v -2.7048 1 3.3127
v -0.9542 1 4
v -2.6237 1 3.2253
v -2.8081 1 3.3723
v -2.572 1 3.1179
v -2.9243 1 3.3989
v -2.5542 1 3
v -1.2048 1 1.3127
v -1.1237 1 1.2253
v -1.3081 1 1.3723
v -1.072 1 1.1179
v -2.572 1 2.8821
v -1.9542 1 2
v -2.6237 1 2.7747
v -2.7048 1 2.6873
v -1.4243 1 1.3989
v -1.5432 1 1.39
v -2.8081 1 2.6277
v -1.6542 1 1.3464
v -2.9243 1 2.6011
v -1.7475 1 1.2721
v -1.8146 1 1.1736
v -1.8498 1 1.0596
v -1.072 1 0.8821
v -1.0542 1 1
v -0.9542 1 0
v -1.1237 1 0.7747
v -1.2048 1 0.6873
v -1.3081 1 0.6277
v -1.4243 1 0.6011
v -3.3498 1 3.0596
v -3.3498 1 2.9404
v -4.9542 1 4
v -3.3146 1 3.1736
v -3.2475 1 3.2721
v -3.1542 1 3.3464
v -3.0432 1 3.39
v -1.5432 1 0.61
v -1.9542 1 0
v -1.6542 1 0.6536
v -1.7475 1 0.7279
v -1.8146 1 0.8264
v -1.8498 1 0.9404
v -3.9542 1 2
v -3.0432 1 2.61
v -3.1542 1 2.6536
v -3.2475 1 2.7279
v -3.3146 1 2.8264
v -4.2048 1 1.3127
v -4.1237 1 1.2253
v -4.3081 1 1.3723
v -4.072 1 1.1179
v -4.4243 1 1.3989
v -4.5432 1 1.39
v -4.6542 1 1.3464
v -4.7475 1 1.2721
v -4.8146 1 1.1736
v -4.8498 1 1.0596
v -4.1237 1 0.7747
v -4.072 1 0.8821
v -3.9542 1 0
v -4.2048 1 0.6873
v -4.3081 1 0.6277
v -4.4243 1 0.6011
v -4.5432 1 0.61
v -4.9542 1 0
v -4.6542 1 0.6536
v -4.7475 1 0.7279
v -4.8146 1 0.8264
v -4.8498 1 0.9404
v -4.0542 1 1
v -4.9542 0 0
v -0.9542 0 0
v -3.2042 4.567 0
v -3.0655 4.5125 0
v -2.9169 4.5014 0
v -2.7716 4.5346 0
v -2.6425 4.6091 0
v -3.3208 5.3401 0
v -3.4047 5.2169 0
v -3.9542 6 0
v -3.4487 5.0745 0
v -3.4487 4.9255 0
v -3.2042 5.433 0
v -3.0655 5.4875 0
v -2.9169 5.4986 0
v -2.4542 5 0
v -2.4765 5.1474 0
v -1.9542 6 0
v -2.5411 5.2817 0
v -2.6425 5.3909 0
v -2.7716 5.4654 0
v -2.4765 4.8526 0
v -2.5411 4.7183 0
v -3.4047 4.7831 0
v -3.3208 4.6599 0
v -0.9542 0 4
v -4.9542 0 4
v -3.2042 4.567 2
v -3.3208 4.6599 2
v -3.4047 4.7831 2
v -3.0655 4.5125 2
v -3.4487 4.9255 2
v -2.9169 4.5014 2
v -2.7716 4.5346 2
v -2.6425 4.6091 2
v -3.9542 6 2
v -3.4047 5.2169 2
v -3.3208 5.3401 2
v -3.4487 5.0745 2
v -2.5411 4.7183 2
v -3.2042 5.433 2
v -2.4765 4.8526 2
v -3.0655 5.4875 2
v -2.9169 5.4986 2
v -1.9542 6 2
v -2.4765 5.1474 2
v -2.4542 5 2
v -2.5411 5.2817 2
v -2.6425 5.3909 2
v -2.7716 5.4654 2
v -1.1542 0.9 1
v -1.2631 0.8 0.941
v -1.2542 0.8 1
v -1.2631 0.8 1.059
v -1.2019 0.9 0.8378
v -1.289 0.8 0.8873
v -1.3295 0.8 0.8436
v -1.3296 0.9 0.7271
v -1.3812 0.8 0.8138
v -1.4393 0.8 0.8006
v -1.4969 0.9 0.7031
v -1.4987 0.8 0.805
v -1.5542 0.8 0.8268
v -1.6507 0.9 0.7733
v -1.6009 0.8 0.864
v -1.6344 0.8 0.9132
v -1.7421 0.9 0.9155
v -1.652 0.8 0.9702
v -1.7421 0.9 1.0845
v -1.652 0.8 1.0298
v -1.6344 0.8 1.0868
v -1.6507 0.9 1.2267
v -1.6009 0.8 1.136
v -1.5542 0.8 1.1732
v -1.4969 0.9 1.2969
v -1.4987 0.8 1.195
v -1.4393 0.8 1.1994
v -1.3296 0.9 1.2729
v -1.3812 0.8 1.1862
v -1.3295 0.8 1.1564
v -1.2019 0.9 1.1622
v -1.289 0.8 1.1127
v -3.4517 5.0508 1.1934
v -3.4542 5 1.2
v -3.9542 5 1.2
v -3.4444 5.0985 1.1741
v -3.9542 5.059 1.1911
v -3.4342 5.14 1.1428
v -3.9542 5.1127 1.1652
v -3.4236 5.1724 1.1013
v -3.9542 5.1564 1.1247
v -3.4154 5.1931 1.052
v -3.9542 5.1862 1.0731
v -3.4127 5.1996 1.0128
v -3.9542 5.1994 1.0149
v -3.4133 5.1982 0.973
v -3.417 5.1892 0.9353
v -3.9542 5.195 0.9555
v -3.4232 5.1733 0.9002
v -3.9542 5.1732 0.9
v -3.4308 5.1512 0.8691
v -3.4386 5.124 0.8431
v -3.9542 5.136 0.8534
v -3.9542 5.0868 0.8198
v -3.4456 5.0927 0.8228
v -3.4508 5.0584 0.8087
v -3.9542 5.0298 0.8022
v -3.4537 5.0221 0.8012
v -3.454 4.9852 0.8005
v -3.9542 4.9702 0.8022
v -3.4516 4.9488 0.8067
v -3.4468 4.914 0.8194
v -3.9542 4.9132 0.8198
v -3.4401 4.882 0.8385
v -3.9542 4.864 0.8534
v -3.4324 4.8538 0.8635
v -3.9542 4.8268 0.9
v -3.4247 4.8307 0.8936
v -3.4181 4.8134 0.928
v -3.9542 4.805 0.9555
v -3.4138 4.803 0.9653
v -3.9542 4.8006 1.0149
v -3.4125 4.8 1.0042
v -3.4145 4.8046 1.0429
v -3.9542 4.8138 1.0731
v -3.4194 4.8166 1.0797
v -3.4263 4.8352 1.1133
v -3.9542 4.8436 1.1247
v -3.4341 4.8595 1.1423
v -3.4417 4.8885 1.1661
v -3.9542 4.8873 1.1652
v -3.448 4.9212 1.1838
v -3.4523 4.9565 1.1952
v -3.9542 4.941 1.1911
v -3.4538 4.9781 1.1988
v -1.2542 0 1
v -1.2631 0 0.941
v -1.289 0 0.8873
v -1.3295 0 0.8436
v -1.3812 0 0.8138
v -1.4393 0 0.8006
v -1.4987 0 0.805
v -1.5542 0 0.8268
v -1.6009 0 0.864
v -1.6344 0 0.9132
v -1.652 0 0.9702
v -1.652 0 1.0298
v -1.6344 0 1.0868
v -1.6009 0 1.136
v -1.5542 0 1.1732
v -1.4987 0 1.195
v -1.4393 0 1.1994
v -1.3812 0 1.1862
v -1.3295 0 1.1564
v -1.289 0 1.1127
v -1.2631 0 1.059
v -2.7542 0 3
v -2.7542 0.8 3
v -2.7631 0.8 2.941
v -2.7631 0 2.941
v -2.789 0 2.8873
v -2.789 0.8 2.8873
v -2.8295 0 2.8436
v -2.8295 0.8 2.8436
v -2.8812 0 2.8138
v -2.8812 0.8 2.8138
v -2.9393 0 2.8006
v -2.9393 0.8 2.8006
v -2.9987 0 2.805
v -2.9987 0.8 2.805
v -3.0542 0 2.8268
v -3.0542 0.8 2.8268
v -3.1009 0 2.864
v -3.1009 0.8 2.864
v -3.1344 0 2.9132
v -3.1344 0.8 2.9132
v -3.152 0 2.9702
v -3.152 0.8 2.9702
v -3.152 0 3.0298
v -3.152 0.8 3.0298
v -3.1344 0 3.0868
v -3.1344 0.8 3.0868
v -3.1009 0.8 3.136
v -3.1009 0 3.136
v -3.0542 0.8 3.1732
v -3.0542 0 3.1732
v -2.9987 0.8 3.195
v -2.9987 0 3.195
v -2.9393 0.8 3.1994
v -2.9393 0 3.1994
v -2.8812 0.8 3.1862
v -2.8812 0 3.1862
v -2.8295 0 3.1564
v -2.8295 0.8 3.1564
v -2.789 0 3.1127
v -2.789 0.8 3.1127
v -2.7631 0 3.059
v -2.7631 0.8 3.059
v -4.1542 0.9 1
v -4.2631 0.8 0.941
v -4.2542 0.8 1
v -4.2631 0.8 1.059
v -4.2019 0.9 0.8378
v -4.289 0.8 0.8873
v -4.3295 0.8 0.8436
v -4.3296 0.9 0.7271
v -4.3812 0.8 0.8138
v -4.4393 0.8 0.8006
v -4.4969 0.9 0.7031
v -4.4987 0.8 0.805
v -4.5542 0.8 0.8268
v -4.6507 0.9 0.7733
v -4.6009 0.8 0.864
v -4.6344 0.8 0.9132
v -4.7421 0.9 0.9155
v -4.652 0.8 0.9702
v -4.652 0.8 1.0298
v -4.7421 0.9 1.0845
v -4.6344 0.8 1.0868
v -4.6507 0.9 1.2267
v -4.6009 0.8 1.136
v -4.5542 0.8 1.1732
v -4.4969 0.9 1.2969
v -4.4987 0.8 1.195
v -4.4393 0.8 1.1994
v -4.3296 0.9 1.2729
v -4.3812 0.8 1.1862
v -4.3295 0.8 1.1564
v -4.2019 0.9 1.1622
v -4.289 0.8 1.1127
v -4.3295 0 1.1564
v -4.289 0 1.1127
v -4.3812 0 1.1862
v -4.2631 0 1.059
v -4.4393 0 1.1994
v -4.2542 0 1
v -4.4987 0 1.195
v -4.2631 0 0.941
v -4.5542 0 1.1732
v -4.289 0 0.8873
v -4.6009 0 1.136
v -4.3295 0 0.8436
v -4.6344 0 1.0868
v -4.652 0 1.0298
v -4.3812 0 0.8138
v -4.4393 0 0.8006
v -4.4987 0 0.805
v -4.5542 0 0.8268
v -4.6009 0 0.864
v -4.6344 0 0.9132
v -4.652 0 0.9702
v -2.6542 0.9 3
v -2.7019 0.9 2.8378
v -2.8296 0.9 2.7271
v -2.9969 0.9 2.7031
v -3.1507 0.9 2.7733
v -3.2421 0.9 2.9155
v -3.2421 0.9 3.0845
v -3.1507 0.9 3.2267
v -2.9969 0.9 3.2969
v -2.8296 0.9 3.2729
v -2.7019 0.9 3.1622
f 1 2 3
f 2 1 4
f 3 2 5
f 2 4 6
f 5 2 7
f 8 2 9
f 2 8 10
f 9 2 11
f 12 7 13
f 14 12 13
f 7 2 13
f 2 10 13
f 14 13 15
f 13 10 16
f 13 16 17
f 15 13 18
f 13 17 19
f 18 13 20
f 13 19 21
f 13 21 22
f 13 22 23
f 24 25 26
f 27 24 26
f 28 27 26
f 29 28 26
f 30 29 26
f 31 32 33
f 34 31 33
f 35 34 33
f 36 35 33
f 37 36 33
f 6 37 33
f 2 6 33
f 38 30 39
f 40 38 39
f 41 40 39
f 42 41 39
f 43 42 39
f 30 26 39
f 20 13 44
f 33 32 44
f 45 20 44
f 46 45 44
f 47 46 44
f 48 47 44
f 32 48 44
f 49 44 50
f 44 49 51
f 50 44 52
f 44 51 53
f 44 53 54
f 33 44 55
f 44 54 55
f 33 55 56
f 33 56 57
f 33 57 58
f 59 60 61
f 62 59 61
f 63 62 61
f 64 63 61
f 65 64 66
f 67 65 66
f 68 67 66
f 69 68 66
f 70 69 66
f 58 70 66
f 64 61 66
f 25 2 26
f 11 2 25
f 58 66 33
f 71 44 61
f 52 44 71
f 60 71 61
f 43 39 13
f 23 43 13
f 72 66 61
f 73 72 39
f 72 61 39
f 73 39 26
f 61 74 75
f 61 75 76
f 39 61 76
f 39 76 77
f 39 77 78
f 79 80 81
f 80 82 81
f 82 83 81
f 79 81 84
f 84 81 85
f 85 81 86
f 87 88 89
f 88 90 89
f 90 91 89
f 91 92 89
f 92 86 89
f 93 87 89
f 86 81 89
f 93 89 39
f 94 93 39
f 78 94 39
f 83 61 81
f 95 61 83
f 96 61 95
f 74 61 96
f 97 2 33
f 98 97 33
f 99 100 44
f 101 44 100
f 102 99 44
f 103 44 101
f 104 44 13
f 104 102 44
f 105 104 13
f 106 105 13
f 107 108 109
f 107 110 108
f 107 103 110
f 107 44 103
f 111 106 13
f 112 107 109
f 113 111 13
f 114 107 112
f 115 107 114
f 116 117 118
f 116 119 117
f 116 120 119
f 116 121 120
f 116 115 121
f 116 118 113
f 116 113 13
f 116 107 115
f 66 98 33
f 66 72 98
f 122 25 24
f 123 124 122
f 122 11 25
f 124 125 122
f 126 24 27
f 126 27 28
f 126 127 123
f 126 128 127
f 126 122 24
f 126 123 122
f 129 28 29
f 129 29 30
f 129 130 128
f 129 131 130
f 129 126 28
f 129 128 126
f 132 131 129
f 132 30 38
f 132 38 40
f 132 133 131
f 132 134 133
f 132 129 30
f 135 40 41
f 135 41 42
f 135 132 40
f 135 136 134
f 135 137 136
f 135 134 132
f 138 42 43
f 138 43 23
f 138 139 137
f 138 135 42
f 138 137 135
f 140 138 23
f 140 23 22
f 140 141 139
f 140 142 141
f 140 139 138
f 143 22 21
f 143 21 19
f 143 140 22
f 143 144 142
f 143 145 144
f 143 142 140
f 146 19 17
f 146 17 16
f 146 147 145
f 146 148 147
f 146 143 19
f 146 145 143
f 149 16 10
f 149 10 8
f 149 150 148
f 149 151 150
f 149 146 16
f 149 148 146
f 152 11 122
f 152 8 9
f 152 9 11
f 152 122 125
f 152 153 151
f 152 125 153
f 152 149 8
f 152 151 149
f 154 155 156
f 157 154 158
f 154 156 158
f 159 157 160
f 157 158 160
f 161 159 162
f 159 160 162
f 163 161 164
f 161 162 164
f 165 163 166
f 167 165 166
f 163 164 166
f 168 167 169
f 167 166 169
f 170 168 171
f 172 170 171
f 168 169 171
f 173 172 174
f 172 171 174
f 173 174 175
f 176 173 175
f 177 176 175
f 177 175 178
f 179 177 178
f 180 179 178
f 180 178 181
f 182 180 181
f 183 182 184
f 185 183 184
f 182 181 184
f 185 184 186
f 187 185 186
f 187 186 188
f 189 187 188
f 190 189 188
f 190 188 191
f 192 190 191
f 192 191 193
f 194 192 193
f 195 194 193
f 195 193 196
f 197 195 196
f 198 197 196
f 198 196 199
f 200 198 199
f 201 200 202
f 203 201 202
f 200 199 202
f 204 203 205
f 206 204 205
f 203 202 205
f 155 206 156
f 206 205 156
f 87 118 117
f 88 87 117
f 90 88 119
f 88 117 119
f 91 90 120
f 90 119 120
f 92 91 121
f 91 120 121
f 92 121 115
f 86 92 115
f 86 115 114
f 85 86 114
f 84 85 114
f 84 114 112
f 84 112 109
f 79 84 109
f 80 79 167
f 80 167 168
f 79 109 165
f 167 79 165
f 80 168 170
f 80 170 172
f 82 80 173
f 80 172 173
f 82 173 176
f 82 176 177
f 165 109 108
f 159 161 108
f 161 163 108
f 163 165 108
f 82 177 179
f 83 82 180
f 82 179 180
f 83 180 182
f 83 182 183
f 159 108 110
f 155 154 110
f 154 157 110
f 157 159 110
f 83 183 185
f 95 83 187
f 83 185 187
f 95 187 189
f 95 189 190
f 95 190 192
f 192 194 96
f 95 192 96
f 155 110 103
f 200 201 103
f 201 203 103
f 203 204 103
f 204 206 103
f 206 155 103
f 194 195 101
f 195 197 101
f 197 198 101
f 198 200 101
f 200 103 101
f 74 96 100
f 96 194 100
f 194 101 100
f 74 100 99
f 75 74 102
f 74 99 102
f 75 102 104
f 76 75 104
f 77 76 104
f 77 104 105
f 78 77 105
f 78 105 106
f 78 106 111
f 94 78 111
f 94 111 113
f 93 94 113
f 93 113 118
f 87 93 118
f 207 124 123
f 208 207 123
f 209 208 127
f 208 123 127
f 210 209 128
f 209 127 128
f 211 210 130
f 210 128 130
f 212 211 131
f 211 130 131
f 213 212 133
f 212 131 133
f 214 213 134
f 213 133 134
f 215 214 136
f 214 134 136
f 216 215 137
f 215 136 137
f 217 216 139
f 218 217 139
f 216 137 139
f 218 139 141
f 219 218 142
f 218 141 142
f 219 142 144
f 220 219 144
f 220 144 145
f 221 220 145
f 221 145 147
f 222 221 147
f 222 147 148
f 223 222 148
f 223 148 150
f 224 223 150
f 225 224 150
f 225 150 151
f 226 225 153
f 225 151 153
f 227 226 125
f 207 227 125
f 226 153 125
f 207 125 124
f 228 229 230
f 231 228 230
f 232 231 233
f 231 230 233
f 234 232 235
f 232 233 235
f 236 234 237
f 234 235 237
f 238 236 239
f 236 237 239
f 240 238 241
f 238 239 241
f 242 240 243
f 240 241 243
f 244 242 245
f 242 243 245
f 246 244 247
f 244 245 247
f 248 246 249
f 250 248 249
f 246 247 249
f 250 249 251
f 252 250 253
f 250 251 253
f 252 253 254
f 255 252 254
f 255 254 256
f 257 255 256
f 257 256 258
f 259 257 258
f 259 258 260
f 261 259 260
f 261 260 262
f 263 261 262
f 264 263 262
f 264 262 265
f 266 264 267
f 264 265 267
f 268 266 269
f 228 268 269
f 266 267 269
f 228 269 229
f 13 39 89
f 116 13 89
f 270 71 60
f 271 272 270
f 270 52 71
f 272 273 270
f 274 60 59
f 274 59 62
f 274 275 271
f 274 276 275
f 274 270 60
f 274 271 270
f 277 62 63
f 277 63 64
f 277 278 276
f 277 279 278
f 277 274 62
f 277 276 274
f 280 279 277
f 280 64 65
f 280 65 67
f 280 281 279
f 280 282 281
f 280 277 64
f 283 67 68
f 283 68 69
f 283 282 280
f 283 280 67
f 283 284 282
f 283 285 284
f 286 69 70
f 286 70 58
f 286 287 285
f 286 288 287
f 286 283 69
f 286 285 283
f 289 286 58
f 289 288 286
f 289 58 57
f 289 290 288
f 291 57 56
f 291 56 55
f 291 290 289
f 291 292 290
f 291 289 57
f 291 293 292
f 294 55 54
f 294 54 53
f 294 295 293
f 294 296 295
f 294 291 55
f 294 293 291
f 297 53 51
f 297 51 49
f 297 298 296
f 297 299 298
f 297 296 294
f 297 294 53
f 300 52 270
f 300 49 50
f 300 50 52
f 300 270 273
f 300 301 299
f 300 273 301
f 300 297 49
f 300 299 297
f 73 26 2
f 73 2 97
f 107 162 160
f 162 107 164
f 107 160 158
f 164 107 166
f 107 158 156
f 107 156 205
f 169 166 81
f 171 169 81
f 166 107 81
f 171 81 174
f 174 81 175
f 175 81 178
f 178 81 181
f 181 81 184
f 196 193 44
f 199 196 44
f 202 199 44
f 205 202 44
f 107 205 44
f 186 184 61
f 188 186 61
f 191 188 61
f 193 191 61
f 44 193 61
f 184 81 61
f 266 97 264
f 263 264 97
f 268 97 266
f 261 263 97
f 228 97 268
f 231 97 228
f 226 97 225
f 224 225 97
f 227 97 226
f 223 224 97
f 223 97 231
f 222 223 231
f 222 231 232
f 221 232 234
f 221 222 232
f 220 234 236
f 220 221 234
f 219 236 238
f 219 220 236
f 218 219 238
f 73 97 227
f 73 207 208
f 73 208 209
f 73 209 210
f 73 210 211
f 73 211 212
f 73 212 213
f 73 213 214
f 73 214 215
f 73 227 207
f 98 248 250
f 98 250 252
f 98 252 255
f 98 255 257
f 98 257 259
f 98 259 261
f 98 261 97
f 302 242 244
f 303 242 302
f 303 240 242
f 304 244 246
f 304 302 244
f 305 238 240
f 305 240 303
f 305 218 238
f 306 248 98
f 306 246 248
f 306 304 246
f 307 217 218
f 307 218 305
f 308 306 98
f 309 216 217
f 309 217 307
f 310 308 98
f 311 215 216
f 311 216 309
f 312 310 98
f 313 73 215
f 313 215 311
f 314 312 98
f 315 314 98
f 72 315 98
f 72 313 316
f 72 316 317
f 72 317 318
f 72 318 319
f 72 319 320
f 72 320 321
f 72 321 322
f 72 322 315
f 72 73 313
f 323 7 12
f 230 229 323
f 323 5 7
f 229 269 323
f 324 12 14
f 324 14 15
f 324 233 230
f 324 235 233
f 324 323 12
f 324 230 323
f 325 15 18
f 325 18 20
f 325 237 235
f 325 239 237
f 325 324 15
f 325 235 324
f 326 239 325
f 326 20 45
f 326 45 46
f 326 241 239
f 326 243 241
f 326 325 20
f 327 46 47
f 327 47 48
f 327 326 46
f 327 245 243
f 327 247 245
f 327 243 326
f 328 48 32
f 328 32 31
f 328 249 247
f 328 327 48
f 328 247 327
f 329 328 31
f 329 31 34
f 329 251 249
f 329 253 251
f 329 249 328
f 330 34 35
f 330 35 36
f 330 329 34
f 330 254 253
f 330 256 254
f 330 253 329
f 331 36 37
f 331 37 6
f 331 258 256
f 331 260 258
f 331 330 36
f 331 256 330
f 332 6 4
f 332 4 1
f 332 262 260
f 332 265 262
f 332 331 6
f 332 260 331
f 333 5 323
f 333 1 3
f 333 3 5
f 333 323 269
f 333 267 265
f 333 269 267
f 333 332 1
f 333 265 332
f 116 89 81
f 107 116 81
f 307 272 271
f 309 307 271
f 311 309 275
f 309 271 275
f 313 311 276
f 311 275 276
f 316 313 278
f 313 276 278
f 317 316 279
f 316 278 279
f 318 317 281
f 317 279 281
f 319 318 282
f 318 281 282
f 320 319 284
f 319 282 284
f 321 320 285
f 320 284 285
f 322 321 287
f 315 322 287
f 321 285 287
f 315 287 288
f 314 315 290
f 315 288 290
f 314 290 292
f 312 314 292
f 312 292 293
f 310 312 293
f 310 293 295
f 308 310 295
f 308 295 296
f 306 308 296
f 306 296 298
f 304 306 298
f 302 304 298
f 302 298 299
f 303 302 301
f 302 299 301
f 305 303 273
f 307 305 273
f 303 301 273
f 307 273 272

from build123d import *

# Parameters (mm, degrees)
BOSS_EXTRU_2_DEPTH      = 2
BOSS_EXTRU_3_DEPTH      = 2
ESQUISSE4_R             = 0.5
ENL_V_MAT_EXTRU_1_DEPTH = 2
ESQUISSE5_R             = 0.2
ENL_V_MAT_EXTRU_2_DEPTH = 1
ESQUISSE6_R             = 0.2
ENL_V_MAT_EXTRU_3_DEPTH = 1
CHANFREIN1_SIZE         = 0.2
CHANFREIN2_SIZE         = 0.2
CHANFREIN3_SIZE         = 0.2


with BuildPart() as part:
    # Esquisse1 → Boss.-Extru.2 (new body)
    with BuildSketch(Plane.XY):
        Polygon((-4.954240171, 0), (-0.954240171, 0), (-0.954240171, 1), (-1.954240171, 1), (-1.954240171, 6), (-3.954240171, 6), (-3.954240171, 1), (-4.954240171, 1), align=None)
    extrude(amount=BOSS_EXTRU_2_DEPTH)

    # Esquisse3 → Boss.-Extru.3 (add)
    with BuildSketch(Plane.XY.offset(2)):
        Polygon((-3.954240171, 1), (-1.954240171, 1), (-0.954240171, 1), (-0.954240171, 0), (-4.954240171, 0), (-4.954240171, 1), align=None)
    extrude(amount=BOSS_EXTRU_3_DEPTH)

    # Esquisse4 → Enlèv. mat.-Extru.1 (cut)
    with BuildSketch(Plane.XY.offset(2)):
        with Locations((-2.954240171, 5)):
            Circle(ESQUISSE4_R)
    extrude(amount=-ENL_V_MAT_EXTRU_1_DEPTH, mode=Mode.SUBTRACT)

    # Esquisse5 → Enlèv. mat.-Extru.2 (cut)
    with BuildSketch(Plane.ZY.offset(3.954240171)):
        with Locations((1, 5)):
            Circle(ESQUISSE5_R)
    extrude(amount=-ENL_V_MAT_EXTRU_2_DEPTH, mode=Mode.SUBTRACT)

    # Esquisse6 → Enlèv. mat.-Extru.3 (cut)
    with BuildSketch(Plane(origin=(0, 1, 0), x_dir=(1, 0, 0), z_dir=(0, 1, 0))):
        with Locations((-4.454240171, -1)):
            Circle(ESQUISSE6_R)
        with Locations((-1.454240171, -1)):
            Circle(ESQUISSE6_R)
        with Locations((-2.954240171, -3)):
            Circle(ESQUISSE6_R)
    extrude(amount=-ENL_V_MAT_EXTRU_3_DEPTH, mode=Mode.SUBTRACT)

    # Chanfrein1
    chanfrein1_edges = [part.edges().sort_by_distance(p)[0] for p in [
        (-3.154240171, 1, 3),
    ]]
    chamfer(chanfrein1_edges, length=CHANFREIN1_SIZE)

    # Chanfrein2
    chanfrein2_edges = [part.edges().sort_by_distance(p)[0] for p in [
        (-1.654240171, 1, 1),
    ]]
    chamfer(chanfrein2_edges, length=CHANFREIN2_SIZE)

    # Chanfrein3
    chanfrein3_edges = [part.edges().sort_by_distance(p)[0] for p in [
        (-4.654240171, 1, 1),
    ]]
    chamfer(chanfrein3_edges, length=CHANFREIN3_SIZE)


solid = part.part
